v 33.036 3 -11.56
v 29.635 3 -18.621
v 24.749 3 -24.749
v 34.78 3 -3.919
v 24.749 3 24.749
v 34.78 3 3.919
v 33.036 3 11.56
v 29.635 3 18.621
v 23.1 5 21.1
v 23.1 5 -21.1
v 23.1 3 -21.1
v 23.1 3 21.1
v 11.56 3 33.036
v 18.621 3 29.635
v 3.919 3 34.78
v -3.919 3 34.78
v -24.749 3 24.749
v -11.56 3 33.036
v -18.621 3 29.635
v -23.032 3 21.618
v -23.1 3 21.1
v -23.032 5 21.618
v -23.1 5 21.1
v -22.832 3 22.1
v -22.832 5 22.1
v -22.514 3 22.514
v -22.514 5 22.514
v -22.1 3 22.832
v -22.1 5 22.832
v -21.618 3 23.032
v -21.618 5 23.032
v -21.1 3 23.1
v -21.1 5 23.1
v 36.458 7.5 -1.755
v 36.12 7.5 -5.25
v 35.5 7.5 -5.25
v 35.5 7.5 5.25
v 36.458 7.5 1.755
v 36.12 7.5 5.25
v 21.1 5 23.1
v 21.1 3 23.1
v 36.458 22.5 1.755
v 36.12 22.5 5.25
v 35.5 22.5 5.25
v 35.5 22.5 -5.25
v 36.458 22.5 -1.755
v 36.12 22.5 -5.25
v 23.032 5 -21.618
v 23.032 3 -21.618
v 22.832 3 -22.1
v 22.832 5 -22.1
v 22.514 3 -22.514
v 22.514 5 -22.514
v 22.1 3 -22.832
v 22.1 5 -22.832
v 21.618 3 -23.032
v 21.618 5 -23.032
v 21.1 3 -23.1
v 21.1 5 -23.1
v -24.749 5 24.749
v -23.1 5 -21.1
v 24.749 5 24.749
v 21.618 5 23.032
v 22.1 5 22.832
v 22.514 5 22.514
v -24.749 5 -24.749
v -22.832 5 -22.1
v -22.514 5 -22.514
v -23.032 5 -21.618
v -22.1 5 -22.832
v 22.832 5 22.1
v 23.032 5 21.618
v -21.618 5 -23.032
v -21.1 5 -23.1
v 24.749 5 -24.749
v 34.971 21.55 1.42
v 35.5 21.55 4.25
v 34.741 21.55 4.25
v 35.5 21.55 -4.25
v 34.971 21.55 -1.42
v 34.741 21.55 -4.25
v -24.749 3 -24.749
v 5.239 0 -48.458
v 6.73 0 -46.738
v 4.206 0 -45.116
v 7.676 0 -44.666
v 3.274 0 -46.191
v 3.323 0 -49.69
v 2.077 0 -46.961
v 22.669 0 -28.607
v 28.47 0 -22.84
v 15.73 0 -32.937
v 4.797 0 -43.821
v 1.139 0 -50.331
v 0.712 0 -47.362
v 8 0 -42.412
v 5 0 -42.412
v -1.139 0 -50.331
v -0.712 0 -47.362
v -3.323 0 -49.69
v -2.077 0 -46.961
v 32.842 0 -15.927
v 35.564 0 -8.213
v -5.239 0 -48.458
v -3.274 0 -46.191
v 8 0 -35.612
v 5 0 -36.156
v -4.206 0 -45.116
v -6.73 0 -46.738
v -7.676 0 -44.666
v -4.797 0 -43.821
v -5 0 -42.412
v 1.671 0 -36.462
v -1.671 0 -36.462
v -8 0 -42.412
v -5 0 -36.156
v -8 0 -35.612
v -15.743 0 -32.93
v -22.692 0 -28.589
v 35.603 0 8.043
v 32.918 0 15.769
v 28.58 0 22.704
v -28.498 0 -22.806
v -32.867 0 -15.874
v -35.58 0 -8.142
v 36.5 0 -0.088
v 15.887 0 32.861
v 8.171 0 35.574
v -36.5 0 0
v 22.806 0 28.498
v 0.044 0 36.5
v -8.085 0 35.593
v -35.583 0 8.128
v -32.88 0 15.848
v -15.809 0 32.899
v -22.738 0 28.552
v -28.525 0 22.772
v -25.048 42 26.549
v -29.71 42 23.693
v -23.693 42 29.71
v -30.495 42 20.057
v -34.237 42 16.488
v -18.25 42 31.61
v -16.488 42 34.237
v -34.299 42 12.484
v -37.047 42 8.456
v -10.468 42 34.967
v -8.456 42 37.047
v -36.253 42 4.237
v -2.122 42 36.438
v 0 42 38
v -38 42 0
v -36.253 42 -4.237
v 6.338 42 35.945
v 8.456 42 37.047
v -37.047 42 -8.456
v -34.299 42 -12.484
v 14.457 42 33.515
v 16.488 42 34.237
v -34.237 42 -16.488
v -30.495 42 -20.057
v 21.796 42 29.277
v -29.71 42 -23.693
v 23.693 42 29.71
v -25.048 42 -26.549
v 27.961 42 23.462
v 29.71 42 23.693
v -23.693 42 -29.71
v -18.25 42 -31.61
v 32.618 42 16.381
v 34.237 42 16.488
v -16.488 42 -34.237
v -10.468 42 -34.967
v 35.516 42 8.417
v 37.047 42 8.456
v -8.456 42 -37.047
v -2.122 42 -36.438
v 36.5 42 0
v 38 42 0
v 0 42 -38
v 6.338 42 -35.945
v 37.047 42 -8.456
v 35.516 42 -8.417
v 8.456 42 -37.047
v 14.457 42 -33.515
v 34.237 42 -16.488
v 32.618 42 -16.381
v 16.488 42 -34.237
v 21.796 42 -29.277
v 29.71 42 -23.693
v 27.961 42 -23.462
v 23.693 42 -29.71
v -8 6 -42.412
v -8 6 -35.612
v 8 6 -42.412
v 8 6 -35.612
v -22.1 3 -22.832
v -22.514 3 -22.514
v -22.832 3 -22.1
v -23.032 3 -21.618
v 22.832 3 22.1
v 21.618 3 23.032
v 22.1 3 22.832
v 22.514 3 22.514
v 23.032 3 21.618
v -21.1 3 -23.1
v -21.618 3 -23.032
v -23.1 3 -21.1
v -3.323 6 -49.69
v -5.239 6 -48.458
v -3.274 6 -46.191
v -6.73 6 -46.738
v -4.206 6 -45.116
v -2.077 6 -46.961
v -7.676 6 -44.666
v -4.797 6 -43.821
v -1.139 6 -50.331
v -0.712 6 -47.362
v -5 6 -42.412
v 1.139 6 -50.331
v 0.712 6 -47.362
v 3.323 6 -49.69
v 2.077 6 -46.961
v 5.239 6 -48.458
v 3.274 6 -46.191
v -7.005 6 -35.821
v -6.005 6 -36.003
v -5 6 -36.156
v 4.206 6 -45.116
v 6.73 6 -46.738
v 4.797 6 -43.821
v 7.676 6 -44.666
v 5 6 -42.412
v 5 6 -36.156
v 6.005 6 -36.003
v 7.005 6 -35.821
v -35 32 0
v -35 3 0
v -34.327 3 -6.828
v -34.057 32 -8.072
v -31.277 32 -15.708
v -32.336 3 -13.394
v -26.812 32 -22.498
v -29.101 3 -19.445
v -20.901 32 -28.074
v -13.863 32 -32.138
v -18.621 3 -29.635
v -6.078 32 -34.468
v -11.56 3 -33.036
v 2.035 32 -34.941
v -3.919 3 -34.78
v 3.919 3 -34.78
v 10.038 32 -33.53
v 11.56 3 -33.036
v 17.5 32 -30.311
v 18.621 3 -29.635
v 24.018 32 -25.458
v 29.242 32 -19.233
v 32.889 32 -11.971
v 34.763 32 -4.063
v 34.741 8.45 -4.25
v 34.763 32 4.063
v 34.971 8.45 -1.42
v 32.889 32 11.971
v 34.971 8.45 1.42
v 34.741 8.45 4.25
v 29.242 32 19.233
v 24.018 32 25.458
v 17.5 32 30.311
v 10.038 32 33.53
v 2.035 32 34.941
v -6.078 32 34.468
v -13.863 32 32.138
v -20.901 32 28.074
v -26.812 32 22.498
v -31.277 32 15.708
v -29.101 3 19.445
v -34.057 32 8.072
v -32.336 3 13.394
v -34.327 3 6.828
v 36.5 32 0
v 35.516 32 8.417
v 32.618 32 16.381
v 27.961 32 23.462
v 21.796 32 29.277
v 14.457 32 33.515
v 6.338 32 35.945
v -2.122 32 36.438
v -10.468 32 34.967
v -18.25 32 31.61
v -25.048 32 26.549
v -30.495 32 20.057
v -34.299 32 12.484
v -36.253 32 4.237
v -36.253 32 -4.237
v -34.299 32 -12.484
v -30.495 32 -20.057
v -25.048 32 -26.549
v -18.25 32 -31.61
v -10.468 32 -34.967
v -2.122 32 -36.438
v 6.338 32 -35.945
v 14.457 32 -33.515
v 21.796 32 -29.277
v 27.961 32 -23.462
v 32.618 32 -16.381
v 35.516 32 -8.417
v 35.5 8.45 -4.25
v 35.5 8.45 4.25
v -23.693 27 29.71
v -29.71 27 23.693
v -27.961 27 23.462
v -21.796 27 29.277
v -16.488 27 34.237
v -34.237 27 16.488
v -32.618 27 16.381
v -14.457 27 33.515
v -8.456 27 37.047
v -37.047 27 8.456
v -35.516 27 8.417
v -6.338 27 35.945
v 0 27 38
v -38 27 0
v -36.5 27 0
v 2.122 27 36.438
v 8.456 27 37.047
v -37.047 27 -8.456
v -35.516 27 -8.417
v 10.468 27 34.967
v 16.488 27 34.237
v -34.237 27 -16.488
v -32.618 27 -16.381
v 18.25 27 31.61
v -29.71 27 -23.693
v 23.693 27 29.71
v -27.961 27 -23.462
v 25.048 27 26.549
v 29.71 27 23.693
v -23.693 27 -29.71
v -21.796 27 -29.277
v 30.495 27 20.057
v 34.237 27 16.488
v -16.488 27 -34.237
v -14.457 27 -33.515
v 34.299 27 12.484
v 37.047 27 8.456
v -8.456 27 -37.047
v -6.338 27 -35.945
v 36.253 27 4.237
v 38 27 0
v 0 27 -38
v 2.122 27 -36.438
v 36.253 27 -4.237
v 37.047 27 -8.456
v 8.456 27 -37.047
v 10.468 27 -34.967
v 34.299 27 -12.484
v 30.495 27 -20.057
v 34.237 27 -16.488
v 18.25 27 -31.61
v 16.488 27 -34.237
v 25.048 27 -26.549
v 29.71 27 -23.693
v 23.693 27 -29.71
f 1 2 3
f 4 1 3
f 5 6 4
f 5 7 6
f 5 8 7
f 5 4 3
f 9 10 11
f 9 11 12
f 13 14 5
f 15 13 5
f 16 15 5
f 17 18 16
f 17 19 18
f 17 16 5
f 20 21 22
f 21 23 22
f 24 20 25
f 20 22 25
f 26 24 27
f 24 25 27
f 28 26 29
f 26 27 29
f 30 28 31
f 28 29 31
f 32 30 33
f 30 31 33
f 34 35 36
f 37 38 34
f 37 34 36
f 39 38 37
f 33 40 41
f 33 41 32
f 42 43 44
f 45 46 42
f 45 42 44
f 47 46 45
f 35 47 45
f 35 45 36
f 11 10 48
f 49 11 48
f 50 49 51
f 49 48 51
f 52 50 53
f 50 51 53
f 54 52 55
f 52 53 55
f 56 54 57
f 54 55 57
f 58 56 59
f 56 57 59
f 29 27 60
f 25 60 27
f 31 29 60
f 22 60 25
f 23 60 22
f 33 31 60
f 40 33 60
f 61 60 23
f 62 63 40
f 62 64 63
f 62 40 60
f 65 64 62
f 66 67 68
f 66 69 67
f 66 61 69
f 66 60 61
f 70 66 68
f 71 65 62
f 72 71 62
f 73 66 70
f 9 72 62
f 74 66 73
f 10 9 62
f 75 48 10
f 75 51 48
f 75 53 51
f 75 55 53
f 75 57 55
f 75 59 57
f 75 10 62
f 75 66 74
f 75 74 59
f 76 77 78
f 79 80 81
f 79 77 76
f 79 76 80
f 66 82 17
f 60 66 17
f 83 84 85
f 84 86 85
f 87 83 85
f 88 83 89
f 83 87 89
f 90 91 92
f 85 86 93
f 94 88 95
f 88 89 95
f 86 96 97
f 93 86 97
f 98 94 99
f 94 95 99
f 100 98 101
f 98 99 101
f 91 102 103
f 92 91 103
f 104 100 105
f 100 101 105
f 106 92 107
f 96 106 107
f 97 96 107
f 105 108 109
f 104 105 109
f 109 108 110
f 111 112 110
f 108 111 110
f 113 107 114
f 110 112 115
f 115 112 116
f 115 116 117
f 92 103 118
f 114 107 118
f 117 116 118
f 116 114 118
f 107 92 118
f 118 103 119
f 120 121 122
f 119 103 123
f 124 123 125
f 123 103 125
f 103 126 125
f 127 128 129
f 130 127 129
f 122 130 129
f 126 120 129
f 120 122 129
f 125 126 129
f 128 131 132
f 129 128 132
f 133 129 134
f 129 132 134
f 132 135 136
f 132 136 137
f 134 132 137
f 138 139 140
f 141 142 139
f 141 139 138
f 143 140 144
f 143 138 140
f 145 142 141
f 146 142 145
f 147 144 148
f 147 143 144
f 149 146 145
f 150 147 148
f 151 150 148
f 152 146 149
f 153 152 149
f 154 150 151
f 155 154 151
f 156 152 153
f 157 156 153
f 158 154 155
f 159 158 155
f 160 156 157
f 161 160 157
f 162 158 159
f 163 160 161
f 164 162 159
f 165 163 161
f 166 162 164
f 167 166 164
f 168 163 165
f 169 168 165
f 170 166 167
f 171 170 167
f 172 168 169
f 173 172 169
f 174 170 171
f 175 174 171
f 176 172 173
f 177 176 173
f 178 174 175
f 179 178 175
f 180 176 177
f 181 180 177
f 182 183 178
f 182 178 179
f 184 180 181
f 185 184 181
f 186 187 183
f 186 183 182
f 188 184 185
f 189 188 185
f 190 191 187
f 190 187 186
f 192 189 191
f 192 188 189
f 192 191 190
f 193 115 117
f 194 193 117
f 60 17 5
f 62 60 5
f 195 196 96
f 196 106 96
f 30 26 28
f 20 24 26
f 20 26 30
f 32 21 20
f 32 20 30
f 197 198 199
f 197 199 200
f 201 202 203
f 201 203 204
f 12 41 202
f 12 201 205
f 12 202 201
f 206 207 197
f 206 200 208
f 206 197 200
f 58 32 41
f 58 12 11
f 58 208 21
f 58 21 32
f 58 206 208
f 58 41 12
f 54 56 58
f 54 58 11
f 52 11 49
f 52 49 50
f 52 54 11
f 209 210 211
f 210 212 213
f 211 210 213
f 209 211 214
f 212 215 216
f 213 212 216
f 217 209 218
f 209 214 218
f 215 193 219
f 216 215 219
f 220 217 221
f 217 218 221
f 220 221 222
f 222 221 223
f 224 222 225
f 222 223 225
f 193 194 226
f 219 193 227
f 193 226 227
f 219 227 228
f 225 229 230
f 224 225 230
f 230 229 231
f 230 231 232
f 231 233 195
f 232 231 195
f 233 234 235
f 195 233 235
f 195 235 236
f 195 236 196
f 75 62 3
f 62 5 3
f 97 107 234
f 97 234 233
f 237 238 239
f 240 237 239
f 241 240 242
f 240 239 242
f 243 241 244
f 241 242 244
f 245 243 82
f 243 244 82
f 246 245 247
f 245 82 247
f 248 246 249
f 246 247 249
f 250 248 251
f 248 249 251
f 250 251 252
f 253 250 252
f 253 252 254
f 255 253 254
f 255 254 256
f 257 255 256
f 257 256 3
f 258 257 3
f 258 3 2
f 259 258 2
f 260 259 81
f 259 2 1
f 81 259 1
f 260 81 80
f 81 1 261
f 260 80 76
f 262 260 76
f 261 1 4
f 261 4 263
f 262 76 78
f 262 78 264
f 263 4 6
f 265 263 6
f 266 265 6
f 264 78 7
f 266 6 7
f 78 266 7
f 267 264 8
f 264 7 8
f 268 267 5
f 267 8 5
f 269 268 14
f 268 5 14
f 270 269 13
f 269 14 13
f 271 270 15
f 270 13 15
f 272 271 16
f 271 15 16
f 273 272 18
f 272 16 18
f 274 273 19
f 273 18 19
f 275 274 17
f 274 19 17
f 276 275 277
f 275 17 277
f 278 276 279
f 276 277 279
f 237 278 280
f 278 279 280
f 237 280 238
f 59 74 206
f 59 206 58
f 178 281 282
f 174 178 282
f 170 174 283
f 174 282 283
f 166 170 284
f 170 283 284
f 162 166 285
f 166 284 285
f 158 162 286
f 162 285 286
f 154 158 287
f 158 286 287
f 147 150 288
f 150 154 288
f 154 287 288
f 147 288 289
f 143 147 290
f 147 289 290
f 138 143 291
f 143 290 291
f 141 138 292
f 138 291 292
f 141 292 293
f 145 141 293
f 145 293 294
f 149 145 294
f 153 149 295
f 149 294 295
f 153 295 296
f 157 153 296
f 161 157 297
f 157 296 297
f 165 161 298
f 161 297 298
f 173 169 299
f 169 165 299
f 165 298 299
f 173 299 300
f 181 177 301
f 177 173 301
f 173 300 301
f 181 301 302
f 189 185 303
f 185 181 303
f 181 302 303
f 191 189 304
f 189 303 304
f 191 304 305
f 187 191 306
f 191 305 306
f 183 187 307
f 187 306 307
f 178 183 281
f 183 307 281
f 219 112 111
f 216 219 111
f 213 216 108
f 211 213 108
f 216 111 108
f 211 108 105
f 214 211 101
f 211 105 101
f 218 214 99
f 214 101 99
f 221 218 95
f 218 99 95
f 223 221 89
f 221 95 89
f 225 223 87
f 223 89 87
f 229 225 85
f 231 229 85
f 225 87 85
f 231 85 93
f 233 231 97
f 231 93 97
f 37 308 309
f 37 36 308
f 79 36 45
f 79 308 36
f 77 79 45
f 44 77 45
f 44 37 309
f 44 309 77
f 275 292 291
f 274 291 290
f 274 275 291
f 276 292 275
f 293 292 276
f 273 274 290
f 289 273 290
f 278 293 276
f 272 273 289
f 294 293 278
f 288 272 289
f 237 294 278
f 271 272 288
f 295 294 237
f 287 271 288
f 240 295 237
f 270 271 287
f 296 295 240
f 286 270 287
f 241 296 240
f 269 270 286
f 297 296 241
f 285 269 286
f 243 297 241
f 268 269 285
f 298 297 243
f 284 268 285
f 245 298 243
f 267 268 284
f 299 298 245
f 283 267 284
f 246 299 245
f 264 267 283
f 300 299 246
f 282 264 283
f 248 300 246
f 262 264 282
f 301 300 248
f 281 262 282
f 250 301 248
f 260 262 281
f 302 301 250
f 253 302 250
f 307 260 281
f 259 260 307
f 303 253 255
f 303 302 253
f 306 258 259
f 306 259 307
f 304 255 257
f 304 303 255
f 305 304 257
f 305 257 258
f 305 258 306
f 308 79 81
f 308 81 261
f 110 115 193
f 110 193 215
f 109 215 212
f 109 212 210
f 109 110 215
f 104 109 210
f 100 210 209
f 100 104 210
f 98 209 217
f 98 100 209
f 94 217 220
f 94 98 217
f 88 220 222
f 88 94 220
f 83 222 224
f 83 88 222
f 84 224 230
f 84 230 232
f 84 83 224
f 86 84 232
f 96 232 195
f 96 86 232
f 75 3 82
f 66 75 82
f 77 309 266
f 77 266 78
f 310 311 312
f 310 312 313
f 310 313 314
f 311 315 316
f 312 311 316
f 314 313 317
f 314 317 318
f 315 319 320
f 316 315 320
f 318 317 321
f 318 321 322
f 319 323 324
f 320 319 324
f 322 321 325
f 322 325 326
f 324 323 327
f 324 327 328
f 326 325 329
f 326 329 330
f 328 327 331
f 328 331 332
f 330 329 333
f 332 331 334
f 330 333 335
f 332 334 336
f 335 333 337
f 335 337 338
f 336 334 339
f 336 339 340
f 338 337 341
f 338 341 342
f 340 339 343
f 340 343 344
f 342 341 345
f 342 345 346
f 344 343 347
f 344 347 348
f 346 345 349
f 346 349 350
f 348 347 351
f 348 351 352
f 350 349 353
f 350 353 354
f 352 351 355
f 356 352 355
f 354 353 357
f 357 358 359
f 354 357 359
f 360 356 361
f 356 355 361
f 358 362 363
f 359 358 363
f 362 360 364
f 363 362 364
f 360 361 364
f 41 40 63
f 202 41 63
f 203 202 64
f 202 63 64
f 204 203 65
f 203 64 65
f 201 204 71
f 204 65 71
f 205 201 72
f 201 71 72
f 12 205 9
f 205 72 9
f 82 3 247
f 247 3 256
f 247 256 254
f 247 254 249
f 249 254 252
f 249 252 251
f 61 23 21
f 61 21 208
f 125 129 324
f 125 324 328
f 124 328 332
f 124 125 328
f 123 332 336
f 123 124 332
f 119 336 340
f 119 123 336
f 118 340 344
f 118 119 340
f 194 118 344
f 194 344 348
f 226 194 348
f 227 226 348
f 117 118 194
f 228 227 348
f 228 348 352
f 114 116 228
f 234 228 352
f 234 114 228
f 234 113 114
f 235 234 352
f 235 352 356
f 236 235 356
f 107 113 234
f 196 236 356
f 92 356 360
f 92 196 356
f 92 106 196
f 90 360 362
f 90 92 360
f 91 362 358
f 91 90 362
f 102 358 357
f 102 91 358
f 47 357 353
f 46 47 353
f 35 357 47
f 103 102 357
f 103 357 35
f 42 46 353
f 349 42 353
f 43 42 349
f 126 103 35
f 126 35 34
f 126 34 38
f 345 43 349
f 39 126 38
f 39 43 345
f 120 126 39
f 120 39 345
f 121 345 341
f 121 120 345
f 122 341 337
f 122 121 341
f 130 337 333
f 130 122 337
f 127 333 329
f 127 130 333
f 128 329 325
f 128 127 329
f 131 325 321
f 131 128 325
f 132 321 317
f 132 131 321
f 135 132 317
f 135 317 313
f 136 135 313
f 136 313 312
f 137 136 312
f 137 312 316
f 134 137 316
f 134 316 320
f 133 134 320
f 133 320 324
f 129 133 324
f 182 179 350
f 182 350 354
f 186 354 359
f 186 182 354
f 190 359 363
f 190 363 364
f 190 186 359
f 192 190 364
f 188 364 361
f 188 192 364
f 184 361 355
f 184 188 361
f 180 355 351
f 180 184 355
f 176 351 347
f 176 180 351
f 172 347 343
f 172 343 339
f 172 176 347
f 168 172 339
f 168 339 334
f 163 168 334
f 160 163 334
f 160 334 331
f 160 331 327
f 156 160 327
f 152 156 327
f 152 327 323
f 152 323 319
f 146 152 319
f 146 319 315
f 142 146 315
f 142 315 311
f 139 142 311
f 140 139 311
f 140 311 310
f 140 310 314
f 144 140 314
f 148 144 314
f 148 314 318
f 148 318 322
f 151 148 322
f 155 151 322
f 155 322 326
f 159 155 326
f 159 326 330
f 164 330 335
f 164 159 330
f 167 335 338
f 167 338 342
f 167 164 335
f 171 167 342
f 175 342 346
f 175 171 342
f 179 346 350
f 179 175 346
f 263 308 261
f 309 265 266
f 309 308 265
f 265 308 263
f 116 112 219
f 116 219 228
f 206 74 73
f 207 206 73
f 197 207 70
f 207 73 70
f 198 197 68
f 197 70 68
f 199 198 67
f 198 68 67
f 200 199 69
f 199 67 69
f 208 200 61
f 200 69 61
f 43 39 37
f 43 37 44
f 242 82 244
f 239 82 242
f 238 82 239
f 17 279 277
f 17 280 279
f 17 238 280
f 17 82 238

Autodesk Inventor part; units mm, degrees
sketch "Sketch1" plane through (0, 0, 0) normal (0, 1, 0) x (-1, 0, 0)
  circle A0 centre (0, 0) radius 36.5
  circle A1 centre (0, 0) radius 35
  dimension "d0" = 73
  dimension "d1" = 70
extrude "Extrusion1" add sketch "Sketch1" along normal blind 3 contours A0 | A1
extrude "Extrusion2" add sketch "Sketch1" along normal blind 120
sketch "Sketch2" plane through (0, 3, 0) normal (0, 1, 0) x (1, 0, 0)
  circle A0 centre (0, 0) radius 35 projected
  line L0 (-24.7487, -24.7487) -> (24.7487, -24.7487)
  line L1 (24.7487, -24.7487) -> (24.7487, 24.7487)
  line L2 (24.7487, 24.7487) -> (-24.7487, 24.7487)
  line L3 (-24.7487, 24.7487) -> (-24.7487, -24.7487)
  line L4 (-24.7487, -24.7487) -> (24.7487, 24.7487) construction
  line L5 (24.7487, -24.7487) -> (-24.7487, 24.7487) construction
extrude "Extrusion3" add sketch "Sketch2" along normal blind 2 contours L1 L0 L3 L2
sketch "Sketch3" plane through (0, 5, 0) normal (0, 1, 0) x (1, 0, 0)
  line L0 (21.1, -23.1) -> (-21.1, -23.1)
  line L1 (-23.1, -21.1) -> (-23.1, 21.1)
  line L2 (-21.1, 23.1) -> (21.1, 23.1)
  line L3 (23.1, 21.1) -> (23.1, -21.1)
  line L4 (23.1, -23.1) -> (-23.1, 23.1) construction
  line L5 (-23.1, -23.1) -> (23.1, 23.1) construction
  arc A0 (-23.1, -21.1) -> (-21.1, -23.1) centre (-21.1, -21.1) ccw
  arc A1 (21.1, -23.1) -> (23.1, -21.1) centre (21.1, -21.1) ccw
  arc A2 (23.1, 21.1) -> (21.1, 23.1) centre (21.1, 21.1) ccw
  arc A3 (-21.1, 23.1) -> (-23.1, 21.1) centre (-21.1, 21.1) ccw
  point P0 (0, 0)
  dimension "d11" = 46.2
  dimension "d12" = 46.2
  dimension "d13" = 2
extrude "Extrusion4" cut sketch "Sketch3" against normal blind 2
sketch "Sketch4" plane through (0, 0, 0) normal (1, 0, 0) x (0, 1, 0)
  line L0 (120, 35) -> (120, -35) projected
  line L1 (120, 0) -> (120, -19.5)
  line L2 (120, -19.5) -> (120, -27)
  circle A0 centre (120, -27) radius 9
  point P0 (0, 0)
  dimension "d16" = 19.5
  dimension "d17" = 7.5
  dimension "d18" = 18
extrude "Extrusion5" cut sketch "Sketch4" along normal through all
sketch "Sketch5" plane through (0, 0, 0) normal (0, -1, 0) x (1, 0, 0)
  line L0 (5, -36.1559) -> (5, -42.4125)
  line L1 (5, -42.4125) -> (-5, -42.4125)
  line L2 (-5, -42.4125) -> (-5, -36.1559)
  line L3 (-5, -30.5875) -> (5, -42.4125) construction
  line L4 (5, -30.5875) -> (-5, -42.4125) construction
  circle A0 centre (0, 0) radius 36.5 projected
  line L5 (8, -35.6125) -> (8, -42.4125)
  line L6 (8, -42.4125) -> (-8, -42.4125)
  line L7 (-8, -42.4125) -> (-8, -35.6125)
  line L8 (-8, -30.5875) -> (8, -42.4125) construction
  line L9 (8, -30.5875) -> (-8, -42.4125) construction
  circle A1 centre (0, 0) radius 36.5
  arc A2 (5, -36.1675) -> (4.9876, -36.1576) centre (0, -42.4125) ccw
  arc A3 (-4.9876, -36.1576) -> (-5, -36.1675) centre (0, -42.4125) ccw
  arc A4 (-8, -42.4125) -> (8, -42.4125) centre (0, -42.4125) ccw
  arc A5 (-5, -42.4125) -> (5, -42.4125) centre (0, -42.4125) ccw
  point P0 (0, -36.5)
  dimension "d21" = 10
  dimension "d22" = 36.5
  dimension "d23" = 16
extrude "Extrusion6" add sketch "Sketch5" against normal blind 6 contours A0 L5 L6 L0 | L6 A4 A5 | L6 L7 A0 L2
ref_plane "Work Plane2" through (36.5, 0, 0) normal (1, 0, 0) x (0, 1, 0)
sketch "Sketch8" plane through (36.5, 0, 0) normal (1, 0, 0) x (0, 1, 0)
  line L0 (8.45, 4.25) -> (21.55, 4.25)
  line L1 (21.55, 4.25) -> (21.55, -4.25)
  line L2 (21.55, -4.25) -> (8.45, -4.25)
  line L3 (8.45, -4.25) -> (8.45, 4.25)
  line L4 (8.45, 4.25) -> (21.55, -4.25) construction
  line L5 (21.55, 4.25) -> (8.45, -4.25) construction
  line L6 (7.5, 5.25) -> (22.5, 5.25)
  line L7 (22.5, 5.25) -> (22.5, -5.25)
  line L8 (22.5, -5.25) -> (7.5, -5.25)
  line L9 (7.5, -5.25) -> (7.5, 5.25)
  line L10 (7.5, 5.25) -> (22.5, -5.25) construction
  line L11 (22.5, 5.25) -> (7.5, -5.25) construction
  point P0 (0, 0)
  point P1 (15, 0)
  dimension "d38" = 13.1
  dimension "d39" = 8.5
  dimension "d40" = 0
  dimension "d41" = 15
  dimension "d42" = 10.5
  dimension "d43" = 15
extrude "Extrusion9" cut sketch "Sketch8" against normal blind 3 contours L0 L1 L2 L3
extrude "Extrusion10" cut sketch "Sketch8" against normal blind 1
ref_plane "Work Plane3" through (0, 93, 0) normal (0, 1, 0) x (1, 0, 0)
ref_plane "Work Plane5" through (0, 32, 0) normal (0, 1, 0) x (1, 0, 0)
sketch "Sketch13" plane through (0, 32, 0) normal (0, 1, 0) x (1, 0, 0)
  circle A0 centre (0, 0) radius 20
  line L0 (24.7487, 24.7487) -> (-24.7487, 24.7487) projected
  circle A1 centre (0, 0) radius 35
  dimension "d61" = 40
extrude "Extrusion14" add sketch "Sketch13" along normal blind 3
sketch "Sketch15" plane through (0, 32, 0) normal (0, 1, 0) x (1, 0, 0)
  circle A0 centre (0, 0) radius 61.7615
extrude "Extrusion16" cut sketch "Sketch15" along normal through all
sketch "Sketch16" plane through (0, 32, 0) normal (0, 1, 0) x (1, 0, 0)
  circle A0 centre (0, 0) radius 36.5
  circle A1 centre (0, 0) radius 38
  dimension "d68" = 76
  dimension "d69" = 73
extrude "Extrusion17" add sketch "Sketch16" along normal blind 10 and the other way blind 5
properties part number "bottom bottom"
